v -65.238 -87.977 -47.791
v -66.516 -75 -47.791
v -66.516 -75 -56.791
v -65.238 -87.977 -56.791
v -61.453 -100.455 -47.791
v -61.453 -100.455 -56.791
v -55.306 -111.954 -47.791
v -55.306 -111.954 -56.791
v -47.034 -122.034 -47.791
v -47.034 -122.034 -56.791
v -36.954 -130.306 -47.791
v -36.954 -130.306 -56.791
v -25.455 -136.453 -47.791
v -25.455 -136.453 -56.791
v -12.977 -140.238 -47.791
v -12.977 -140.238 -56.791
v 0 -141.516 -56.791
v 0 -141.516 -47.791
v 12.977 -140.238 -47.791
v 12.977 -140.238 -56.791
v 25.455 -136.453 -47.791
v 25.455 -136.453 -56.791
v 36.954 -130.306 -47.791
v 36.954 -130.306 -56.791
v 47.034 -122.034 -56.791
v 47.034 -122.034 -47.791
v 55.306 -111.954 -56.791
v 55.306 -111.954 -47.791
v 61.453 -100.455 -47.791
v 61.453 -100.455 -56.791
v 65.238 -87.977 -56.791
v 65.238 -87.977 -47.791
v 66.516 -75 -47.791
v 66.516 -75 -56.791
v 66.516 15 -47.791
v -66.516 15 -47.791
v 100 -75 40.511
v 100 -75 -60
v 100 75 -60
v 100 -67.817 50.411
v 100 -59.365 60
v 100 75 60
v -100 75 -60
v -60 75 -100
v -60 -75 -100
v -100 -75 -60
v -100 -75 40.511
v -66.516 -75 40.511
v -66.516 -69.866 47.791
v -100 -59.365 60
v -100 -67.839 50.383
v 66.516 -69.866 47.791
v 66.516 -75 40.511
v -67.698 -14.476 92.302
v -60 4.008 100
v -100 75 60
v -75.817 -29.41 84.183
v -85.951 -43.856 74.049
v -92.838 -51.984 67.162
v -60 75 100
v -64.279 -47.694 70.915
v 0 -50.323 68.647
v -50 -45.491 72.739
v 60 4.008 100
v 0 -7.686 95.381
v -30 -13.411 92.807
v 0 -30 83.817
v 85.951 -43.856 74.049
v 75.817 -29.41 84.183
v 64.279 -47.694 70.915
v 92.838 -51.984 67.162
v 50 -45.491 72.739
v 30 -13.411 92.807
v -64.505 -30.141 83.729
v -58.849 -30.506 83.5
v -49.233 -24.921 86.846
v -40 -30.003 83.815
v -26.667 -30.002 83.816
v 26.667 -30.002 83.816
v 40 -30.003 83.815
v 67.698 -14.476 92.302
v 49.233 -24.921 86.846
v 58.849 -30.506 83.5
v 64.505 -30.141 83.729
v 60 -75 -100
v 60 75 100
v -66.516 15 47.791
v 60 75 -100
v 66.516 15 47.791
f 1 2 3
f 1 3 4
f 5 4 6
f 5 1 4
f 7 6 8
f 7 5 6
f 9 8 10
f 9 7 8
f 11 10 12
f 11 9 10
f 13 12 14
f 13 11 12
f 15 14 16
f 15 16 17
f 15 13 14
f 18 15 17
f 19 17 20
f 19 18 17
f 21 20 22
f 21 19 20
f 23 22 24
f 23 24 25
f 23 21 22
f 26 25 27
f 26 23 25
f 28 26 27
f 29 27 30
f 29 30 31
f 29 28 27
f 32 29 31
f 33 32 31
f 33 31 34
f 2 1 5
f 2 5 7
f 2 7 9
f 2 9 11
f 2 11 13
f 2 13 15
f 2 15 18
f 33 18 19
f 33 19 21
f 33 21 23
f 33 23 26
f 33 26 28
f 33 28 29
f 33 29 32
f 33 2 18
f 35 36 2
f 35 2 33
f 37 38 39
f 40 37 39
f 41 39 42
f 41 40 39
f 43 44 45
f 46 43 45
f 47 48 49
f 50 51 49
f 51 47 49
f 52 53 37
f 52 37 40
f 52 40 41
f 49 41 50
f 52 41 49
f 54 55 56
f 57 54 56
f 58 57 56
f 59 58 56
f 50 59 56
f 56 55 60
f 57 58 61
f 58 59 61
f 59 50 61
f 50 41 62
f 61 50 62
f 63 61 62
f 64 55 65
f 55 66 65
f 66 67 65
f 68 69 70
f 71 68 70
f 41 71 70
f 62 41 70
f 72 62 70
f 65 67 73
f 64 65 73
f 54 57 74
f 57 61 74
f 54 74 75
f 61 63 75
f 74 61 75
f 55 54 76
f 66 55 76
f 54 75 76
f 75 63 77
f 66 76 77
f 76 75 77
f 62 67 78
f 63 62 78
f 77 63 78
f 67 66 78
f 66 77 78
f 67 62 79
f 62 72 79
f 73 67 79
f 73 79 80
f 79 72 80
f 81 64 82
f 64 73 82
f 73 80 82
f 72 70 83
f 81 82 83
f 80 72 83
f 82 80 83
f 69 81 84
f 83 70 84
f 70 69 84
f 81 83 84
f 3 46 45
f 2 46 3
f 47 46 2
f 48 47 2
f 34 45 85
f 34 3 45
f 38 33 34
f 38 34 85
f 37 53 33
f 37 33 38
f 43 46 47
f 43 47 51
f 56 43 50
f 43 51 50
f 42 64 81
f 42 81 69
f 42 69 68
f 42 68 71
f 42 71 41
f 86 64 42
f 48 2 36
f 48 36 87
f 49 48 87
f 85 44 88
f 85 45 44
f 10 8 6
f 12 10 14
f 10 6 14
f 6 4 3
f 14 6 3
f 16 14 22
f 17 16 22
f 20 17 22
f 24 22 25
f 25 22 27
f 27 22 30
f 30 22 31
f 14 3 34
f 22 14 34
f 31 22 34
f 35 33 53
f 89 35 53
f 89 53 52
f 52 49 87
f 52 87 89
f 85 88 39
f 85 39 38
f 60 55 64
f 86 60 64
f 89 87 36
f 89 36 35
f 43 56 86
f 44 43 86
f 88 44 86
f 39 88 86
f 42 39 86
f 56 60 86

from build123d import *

# Parameters (mm, degrees)
F0_W     = 200
F0_H     = 200
F1_DEPTH = 75
F2_SIZE  = 40
F3_W     = 133.0324709415
F3_H     = 95.5820605159
F4_DEPTH = 90
F6_DEPTH = 200.9
F8_DEPTH = 9


with BuildPart() as f1:
    # F0 (on Front) → F1 (new body, symmetric)
    with BuildSketch(Plane.XZ):
        Rectangle(F0_W, F0_H)
    extrude(amount=F1_DEPTH, both=True)

    # F2
    f2_edges = [f1.edges().sort_by_distance(p)[0] for p in [
        (100, 0, 100),
        (-100, 0, 100),
        (-100, 0, -100),
        (100, 0, -100),
    ]]
    chamfer(f2_edges, length=F2_SIZE)

    # F3 (on face) → F4 (cut)
    with BuildSketch(Plane.XZ.offset(75)):
        Rectangle(F3_W, F3_H)
    extrude(amount=-F4_DEPTH, mode=Mode.SUBTRACT)

    # F5 (on face) → F6 (cut)
    with BuildSketch(Plane.YZ.offset(100)):
        with BuildLine():
            Line((-95.2423661947, -20.9655482322), (-87.9932567477, -22.9425765574))
            add(Edge.make_bspline(
                [(-87.9932567477, -22.9425765574), (-88.9180534775, -7.4435947272), (-90.1399220102, 13.0341141319), (-78.4659039791, 35.1732019961), (-75, 40.5114376133)],
                knots=[0, 0, 0, 0, 0.2716788235, 0.3589500209, 0.3589500209, 0.3589500209, 0.3589500209], degree=3))
            Line((-75, 40.5114376133), (-75, 60))
            Line((-75, 60), (-59.3654634192, 60))
            add(Edge.make_bspline(
                [(-59.3654634192, 60), (-50.780700635, 68.9119189144), (-16.3848726556, 97.0242933868), (26.186759324, 107.4256565423), (56.3297905028, 114.7903874516)],
                knots=[0.4677889294, 0.4677889294, 0.4677889294, 0.4677889294, 0.6231656117, 1, 1, 1, 1], degree=3))
            Line((56.3297905028, 114.7903874516), (-23.4103426337, 159.6030145884))
            Line((-23.4103426337, 159.6030145884), (-86.6752415895, 159.6030145884))
            Line((-86.6752415895, 159.6030145884), (-134.7829252481, 0))
            Line((-134.7829252481, 0), (-95.2423661947, -20.9655482322))
        make_face()
        with BuildLine():
            Line((-75, 60), (-75, 40.5114376133))
            add(Edge.make_bspline(
                [(-75, 40.5114376133), (-70.6775520716, 47.1689346541), (-65.3789539733, 53.7573417509), (-59.3654634192, 60)],
                knots=[0.3589500209, 0.3589500209, 0.3589500209, 0.3589500209, 0.4677889294, 0.4677889294, 0.4677889294, 0.4677889294], degree=3))
            Line((-59.3654634192, 60), (-75, 60))
        make_face()
    extrude(amount=-F6_DEPTH, mode=Mode.SUBTRACT)

    # F7 (on face) → F8 (join)
    with BuildSketch(Plane.XY.offset(-47.7910302579)):
        with BuildLine():
            Line((66.5162354708, -75), (-66.5162354708, -75))
            ThreePointArc((-66.5162354708, -75), (0, -141.5162354708), (66.5162354708, -75))
        make_face()
    extrude(amount=-F8_DEPTH)


solid = f1.part
